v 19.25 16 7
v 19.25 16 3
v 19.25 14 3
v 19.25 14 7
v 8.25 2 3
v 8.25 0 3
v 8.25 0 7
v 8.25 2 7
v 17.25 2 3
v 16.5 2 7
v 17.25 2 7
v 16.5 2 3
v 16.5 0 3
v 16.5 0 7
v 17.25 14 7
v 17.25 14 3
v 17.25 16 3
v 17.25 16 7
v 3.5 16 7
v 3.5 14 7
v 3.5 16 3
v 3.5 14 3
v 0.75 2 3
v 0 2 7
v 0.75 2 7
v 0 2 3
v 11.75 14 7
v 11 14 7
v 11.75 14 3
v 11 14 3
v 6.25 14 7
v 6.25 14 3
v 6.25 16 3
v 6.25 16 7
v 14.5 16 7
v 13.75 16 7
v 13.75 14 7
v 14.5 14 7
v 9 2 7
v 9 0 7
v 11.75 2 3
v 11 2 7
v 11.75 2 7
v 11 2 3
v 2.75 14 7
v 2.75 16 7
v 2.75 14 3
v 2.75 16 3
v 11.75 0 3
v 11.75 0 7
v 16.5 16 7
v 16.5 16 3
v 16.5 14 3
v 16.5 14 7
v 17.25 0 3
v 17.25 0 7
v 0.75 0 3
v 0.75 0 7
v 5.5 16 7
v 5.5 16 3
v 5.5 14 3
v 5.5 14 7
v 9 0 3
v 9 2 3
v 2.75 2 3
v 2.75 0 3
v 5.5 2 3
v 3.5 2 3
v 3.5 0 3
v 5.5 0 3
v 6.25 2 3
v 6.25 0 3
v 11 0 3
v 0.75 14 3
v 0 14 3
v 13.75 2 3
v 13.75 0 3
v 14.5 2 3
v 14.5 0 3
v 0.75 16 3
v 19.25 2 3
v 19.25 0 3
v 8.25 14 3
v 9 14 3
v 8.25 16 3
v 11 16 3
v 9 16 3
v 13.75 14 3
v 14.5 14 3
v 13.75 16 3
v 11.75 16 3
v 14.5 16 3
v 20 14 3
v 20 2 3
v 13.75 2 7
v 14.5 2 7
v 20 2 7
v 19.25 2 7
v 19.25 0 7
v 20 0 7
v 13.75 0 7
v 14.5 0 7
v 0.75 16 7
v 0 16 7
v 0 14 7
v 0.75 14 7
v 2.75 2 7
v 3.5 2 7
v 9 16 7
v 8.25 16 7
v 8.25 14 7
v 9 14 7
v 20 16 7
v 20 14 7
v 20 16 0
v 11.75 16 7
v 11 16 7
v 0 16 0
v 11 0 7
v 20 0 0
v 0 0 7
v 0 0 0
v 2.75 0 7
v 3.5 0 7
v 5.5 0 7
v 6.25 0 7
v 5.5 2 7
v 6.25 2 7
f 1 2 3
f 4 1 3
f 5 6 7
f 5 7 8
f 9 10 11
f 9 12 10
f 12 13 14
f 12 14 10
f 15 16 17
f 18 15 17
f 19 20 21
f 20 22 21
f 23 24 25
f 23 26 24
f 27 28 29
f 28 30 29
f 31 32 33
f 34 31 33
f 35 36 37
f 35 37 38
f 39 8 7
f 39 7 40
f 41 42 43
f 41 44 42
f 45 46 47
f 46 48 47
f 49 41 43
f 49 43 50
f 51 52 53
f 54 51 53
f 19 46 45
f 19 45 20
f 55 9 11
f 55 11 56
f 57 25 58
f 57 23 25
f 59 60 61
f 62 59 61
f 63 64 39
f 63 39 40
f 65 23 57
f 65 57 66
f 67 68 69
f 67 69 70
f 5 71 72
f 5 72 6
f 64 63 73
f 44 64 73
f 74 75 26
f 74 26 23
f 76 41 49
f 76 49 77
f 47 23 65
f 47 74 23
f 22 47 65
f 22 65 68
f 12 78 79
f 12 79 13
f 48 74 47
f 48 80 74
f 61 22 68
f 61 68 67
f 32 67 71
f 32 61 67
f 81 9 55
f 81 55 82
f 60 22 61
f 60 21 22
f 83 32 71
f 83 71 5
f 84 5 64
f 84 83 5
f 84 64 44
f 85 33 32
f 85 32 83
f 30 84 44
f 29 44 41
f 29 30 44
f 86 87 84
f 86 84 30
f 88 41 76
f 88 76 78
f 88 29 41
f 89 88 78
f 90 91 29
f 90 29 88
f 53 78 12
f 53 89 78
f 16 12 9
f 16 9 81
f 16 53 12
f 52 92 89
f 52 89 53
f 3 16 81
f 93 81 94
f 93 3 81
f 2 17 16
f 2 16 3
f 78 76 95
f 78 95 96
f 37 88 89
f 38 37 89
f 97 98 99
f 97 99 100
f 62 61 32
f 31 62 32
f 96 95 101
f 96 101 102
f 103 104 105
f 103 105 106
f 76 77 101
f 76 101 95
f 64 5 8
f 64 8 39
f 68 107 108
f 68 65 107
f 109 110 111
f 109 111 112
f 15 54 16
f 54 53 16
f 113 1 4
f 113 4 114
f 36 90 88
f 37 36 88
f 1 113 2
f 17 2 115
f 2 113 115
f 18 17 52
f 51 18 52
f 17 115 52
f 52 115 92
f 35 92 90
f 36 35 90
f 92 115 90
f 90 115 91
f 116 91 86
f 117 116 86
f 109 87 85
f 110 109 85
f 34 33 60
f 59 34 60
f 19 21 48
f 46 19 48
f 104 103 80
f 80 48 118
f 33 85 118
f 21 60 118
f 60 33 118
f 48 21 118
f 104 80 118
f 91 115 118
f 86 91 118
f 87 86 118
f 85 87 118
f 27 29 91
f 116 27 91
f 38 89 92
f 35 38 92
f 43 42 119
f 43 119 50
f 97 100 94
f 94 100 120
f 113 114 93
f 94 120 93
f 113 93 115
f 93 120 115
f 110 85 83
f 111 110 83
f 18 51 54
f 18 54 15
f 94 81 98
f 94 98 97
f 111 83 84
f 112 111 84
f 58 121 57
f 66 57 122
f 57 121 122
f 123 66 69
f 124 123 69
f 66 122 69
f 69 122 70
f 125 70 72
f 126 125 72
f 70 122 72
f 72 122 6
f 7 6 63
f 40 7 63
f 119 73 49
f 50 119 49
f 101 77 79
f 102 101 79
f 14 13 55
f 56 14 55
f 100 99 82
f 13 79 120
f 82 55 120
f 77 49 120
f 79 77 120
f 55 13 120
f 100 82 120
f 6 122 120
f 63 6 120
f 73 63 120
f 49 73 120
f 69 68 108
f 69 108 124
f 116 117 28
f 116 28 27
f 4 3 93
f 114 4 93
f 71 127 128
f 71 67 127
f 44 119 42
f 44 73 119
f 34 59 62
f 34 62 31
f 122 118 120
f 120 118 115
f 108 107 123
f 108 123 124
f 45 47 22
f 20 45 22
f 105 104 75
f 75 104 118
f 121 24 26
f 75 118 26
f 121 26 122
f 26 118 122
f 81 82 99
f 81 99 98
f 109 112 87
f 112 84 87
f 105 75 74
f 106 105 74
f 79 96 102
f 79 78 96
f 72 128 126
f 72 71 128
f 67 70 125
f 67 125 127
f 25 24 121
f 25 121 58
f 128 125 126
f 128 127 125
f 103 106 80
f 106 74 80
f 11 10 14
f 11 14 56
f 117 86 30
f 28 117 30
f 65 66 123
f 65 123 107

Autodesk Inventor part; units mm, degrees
ref_plane "YZ Plane" through (0, 0, 0) normal (1, 0, 0) x (0, 1, 0)
ref_plane "XZ Plane" through (0, 0, 0) normal (0, 1, 0) x (-1, 0, 0)
ref_plane "XY Plane" through (0, 0, 0) normal (0, 0, 1) x (1, 0, 0)
sketch "Esquisse1" plane through (0, 0, 0) normal (0, 0, 1) x (1, 0, 0)
  line L0 (0, 0) -> (20, 0)
  line L1 (20, 0) -> (20, 16)
  line L2 (20, 16) -> (0, 16)
  line L3 (0, 16) -> (0, 0)
  dimension "d0" = 20
  dimension "d1" = 16
extrude "Extrusion1" add sketch "Esquisse1" along normal blind 3
sketch "Esquisse2" plane through (0, 0, 3) normal (0, 0, 1) x (1, 0, 0)
  line L0 (20, 0) -> (20, 16) projected
  line L1 (20, 8) -> (0, 8)
  line L2 (0, 16) -> (0, 0) projected
  line L3 (20, 16) -> (0, 16)
  line L4 (0, 16) -> (0, 14)
  line L5 (0, 14) -> (20, 14)
  line L6 (20, 14) -> (20, 16)
  line L7 (20, 16) -> (19.25, 16)
  line L8 (19.25, 16) -> (19.25, 14)
  line L9 (19.25, 14) -> (20, 14)
  line L10 (20, 14) -> (20, 16)
  line L11 (19.25, 14) -> (17.25, 14)
  line L12 (17.25, 14) -> (17.25, 16)
  line L13 (17.25, 16) -> (16.5, 16)
  line L14 (16.5, 16) -> (16.5, 14)
  line L15 (16.5, 14) -> (17.25, 14)
  line L16 (17.25, 14) -> (17.25, 16)
  line L17 (16.5, 14) -> (14.5, 14)
  line L18 (14.5, 14) -> (14.5, 16)
  line L19 (14.5, 16) -> (13.75, 16)
  line L20 (13.75, 16) -> (13.75, 14)
  line L21 (13.75, 14) -> (14.5, 14)
  line L22 (14.5, 14) -> (14.5, 16)
  line L23 (13.75, 14) -> (11.75, 14)
  line L24 (11.75, 14) -> (11.75, 16)
  line L25 (11.75, 16) -> (11, 16)
  line L26 (11, 16) -> (11, 14)
  line L27 (11, 14) -> (11.75, 14)
  line L28 (11.75, 14) -> (11.75, 16)
  line L29 (11, 14) -> (9, 14)
  line L30 (9, 14) -> (9, 16)
  line L31 (9, 16) -> (8.25, 16)
  line L32 (8.25, 16) -> (8.25, 14)
  line L33 (8.25, 14) -> (9, 14)
  line L34 (9, 14) -> (9, 16)
  line L35 (8.25, 14) -> (6.25, 14)
  line L36 (6.25, 14) -> (6.25, 16)
  line L37 (6.25, 16) -> (5.5, 16)
  line L38 (5.5, 16) -> (5.5, 14)
  line L39 (5.5, 14) -> (6.25, 14)
  line L40 (6.25, 14) -> (6.25, 16)
  line L41 (5.5, 14) -> (3.5, 14)
  line L42 (3.5, 14) -> (3.5, 16)
  line L43 (3.5, 16) -> (2.75, 16)
  line L44 (2.75, 16) -> (2.75, 14)
  line L45 (2.75, 14) -> (3.5, 14)
  line L46 (3.5, 14) -> (3.5, 16)
  line L47 (2.75, 14) -> (0.75, 14)
  line L48 (0.75, 14) -> (0.75, 16)
  line L49 (20, 0) -> (0, 0)
  line L50 (0, 0) -> (0, 2)
  line L51 (0, 2) -> (20, 2)
  line L52 (20, 2) -> (20, 0)
  line L53 (20, 0) -> (19.25, 0)
  line L54 (19.25, 0) -> (19.25, 2)
  line L55 (19.25, 2) -> (20, 2)
  line L56 (20, 2) -> (20, 0)
  line L57 (19.25, 2) -> (17.25, 2)
  line L58 (17.25, 2) -> (17.25, 0)
  line L59 (17.25, 0) -> (16.5, 0)
  line L60 (16.5, 0) -> (16.5, 2)
  line L61 (16.5, 2) -> (17.25, 2)
  line L62 (17.25, 2) -> (17.25, 0)
  line L63 (16.5, 2) -> (14.5, 2)
  line L64 (14.5, 2) -> (14.5, 0)
  line L65 (14.5, 0) -> (13.75, 0)
  line L66 (13.75, 0) -> (13.75, 2)
  line L67 (13.75, 2) -> (14.5, 2)
  line L68 (14.5, 2) -> (14.5, 0)
  line L69 (13.75, 2) -> (11.75, 2)
  line L70 (11.75, 2) -> (11.75, 0)
  line L71 (11.75, 0) -> (11, 0)
  line L72 (11, 0) -> (11, 2)
  line L73 (11, 2) -> (11.75, 2)
  line L74 (11.75, 2) -> (11.75, 0)
  line L75 (11, 2) -> (9, 2)
  line L76 (9, 2) -> (9, 0)
  line L77 (9, 0) -> (8.25, 0)
  line L78 (8.25, 0) -> (8.25, 2)
  line L79 (8.25, 2) -> (9, 2)
  line L80 (9, 2) -> (9, 0)
  line L81 (8.25, 2) -> (6.25, 2)
  line L82 (6.25, 2) -> (6.25, 0)
  line L83 (6.25, 0) -> (5.5, 0)
  line L84 (5.5, 0) -> (5.5, 2)
  line L85 (5.5, 2) -> (6.25, 2)
  line L86 (6.25, 2) -> (6.25, 0)
  line L87 (5.5, 2) -> (3.5, 2)
  line L88 (3.5, 2) -> (3.5, 0)
  line L89 (3.5, 0) -> (2.75, 0)
  line L90 (2.75, 0) -> (2.75, 2)
  line L91 (2.75, 2) -> (3.5, 2)
  line L92 (3.5, 2) -> (3.5, 0)
  line L93 (2.75, 2) -> (0.75, 2)
  line L94 (0.75, 2) -> (0.75, 0)
  point P0 (0, 0)
  dimension "d4" = 2
  dimension "d5" = 0.75
  dimension "d6" = 2
  dimension "d7" = 2
  dimension "d8" = 2
  dimension "d9" = 2
  dimension "d10" = 2
  dimension "d11" = 2
  dimension "d12" = 2
extrude "Extrusion2" add sketch "Esquisse2" along normal blind 4 contours L49 L54 L51 L0 | L49 L60 L51 L58 | L5 L8 L3 L0 | L2 L3 L48 L5 | L51 L94 L49 L2 | L49 L66 L51 L64 | L5 L14 L3 L12 | L44 L3 L42 L5 | L51 L88 L49 L90 | L49 L72 L51 L70 | L5 L20 L3 L18 | L38 L3 L36 L5 | L51 L82 L49 L84 | L49 L78 L51 L76 | L5 L26 L3 L24 | L32 L3 L30 L5
properties part number "driver DRV8825"
